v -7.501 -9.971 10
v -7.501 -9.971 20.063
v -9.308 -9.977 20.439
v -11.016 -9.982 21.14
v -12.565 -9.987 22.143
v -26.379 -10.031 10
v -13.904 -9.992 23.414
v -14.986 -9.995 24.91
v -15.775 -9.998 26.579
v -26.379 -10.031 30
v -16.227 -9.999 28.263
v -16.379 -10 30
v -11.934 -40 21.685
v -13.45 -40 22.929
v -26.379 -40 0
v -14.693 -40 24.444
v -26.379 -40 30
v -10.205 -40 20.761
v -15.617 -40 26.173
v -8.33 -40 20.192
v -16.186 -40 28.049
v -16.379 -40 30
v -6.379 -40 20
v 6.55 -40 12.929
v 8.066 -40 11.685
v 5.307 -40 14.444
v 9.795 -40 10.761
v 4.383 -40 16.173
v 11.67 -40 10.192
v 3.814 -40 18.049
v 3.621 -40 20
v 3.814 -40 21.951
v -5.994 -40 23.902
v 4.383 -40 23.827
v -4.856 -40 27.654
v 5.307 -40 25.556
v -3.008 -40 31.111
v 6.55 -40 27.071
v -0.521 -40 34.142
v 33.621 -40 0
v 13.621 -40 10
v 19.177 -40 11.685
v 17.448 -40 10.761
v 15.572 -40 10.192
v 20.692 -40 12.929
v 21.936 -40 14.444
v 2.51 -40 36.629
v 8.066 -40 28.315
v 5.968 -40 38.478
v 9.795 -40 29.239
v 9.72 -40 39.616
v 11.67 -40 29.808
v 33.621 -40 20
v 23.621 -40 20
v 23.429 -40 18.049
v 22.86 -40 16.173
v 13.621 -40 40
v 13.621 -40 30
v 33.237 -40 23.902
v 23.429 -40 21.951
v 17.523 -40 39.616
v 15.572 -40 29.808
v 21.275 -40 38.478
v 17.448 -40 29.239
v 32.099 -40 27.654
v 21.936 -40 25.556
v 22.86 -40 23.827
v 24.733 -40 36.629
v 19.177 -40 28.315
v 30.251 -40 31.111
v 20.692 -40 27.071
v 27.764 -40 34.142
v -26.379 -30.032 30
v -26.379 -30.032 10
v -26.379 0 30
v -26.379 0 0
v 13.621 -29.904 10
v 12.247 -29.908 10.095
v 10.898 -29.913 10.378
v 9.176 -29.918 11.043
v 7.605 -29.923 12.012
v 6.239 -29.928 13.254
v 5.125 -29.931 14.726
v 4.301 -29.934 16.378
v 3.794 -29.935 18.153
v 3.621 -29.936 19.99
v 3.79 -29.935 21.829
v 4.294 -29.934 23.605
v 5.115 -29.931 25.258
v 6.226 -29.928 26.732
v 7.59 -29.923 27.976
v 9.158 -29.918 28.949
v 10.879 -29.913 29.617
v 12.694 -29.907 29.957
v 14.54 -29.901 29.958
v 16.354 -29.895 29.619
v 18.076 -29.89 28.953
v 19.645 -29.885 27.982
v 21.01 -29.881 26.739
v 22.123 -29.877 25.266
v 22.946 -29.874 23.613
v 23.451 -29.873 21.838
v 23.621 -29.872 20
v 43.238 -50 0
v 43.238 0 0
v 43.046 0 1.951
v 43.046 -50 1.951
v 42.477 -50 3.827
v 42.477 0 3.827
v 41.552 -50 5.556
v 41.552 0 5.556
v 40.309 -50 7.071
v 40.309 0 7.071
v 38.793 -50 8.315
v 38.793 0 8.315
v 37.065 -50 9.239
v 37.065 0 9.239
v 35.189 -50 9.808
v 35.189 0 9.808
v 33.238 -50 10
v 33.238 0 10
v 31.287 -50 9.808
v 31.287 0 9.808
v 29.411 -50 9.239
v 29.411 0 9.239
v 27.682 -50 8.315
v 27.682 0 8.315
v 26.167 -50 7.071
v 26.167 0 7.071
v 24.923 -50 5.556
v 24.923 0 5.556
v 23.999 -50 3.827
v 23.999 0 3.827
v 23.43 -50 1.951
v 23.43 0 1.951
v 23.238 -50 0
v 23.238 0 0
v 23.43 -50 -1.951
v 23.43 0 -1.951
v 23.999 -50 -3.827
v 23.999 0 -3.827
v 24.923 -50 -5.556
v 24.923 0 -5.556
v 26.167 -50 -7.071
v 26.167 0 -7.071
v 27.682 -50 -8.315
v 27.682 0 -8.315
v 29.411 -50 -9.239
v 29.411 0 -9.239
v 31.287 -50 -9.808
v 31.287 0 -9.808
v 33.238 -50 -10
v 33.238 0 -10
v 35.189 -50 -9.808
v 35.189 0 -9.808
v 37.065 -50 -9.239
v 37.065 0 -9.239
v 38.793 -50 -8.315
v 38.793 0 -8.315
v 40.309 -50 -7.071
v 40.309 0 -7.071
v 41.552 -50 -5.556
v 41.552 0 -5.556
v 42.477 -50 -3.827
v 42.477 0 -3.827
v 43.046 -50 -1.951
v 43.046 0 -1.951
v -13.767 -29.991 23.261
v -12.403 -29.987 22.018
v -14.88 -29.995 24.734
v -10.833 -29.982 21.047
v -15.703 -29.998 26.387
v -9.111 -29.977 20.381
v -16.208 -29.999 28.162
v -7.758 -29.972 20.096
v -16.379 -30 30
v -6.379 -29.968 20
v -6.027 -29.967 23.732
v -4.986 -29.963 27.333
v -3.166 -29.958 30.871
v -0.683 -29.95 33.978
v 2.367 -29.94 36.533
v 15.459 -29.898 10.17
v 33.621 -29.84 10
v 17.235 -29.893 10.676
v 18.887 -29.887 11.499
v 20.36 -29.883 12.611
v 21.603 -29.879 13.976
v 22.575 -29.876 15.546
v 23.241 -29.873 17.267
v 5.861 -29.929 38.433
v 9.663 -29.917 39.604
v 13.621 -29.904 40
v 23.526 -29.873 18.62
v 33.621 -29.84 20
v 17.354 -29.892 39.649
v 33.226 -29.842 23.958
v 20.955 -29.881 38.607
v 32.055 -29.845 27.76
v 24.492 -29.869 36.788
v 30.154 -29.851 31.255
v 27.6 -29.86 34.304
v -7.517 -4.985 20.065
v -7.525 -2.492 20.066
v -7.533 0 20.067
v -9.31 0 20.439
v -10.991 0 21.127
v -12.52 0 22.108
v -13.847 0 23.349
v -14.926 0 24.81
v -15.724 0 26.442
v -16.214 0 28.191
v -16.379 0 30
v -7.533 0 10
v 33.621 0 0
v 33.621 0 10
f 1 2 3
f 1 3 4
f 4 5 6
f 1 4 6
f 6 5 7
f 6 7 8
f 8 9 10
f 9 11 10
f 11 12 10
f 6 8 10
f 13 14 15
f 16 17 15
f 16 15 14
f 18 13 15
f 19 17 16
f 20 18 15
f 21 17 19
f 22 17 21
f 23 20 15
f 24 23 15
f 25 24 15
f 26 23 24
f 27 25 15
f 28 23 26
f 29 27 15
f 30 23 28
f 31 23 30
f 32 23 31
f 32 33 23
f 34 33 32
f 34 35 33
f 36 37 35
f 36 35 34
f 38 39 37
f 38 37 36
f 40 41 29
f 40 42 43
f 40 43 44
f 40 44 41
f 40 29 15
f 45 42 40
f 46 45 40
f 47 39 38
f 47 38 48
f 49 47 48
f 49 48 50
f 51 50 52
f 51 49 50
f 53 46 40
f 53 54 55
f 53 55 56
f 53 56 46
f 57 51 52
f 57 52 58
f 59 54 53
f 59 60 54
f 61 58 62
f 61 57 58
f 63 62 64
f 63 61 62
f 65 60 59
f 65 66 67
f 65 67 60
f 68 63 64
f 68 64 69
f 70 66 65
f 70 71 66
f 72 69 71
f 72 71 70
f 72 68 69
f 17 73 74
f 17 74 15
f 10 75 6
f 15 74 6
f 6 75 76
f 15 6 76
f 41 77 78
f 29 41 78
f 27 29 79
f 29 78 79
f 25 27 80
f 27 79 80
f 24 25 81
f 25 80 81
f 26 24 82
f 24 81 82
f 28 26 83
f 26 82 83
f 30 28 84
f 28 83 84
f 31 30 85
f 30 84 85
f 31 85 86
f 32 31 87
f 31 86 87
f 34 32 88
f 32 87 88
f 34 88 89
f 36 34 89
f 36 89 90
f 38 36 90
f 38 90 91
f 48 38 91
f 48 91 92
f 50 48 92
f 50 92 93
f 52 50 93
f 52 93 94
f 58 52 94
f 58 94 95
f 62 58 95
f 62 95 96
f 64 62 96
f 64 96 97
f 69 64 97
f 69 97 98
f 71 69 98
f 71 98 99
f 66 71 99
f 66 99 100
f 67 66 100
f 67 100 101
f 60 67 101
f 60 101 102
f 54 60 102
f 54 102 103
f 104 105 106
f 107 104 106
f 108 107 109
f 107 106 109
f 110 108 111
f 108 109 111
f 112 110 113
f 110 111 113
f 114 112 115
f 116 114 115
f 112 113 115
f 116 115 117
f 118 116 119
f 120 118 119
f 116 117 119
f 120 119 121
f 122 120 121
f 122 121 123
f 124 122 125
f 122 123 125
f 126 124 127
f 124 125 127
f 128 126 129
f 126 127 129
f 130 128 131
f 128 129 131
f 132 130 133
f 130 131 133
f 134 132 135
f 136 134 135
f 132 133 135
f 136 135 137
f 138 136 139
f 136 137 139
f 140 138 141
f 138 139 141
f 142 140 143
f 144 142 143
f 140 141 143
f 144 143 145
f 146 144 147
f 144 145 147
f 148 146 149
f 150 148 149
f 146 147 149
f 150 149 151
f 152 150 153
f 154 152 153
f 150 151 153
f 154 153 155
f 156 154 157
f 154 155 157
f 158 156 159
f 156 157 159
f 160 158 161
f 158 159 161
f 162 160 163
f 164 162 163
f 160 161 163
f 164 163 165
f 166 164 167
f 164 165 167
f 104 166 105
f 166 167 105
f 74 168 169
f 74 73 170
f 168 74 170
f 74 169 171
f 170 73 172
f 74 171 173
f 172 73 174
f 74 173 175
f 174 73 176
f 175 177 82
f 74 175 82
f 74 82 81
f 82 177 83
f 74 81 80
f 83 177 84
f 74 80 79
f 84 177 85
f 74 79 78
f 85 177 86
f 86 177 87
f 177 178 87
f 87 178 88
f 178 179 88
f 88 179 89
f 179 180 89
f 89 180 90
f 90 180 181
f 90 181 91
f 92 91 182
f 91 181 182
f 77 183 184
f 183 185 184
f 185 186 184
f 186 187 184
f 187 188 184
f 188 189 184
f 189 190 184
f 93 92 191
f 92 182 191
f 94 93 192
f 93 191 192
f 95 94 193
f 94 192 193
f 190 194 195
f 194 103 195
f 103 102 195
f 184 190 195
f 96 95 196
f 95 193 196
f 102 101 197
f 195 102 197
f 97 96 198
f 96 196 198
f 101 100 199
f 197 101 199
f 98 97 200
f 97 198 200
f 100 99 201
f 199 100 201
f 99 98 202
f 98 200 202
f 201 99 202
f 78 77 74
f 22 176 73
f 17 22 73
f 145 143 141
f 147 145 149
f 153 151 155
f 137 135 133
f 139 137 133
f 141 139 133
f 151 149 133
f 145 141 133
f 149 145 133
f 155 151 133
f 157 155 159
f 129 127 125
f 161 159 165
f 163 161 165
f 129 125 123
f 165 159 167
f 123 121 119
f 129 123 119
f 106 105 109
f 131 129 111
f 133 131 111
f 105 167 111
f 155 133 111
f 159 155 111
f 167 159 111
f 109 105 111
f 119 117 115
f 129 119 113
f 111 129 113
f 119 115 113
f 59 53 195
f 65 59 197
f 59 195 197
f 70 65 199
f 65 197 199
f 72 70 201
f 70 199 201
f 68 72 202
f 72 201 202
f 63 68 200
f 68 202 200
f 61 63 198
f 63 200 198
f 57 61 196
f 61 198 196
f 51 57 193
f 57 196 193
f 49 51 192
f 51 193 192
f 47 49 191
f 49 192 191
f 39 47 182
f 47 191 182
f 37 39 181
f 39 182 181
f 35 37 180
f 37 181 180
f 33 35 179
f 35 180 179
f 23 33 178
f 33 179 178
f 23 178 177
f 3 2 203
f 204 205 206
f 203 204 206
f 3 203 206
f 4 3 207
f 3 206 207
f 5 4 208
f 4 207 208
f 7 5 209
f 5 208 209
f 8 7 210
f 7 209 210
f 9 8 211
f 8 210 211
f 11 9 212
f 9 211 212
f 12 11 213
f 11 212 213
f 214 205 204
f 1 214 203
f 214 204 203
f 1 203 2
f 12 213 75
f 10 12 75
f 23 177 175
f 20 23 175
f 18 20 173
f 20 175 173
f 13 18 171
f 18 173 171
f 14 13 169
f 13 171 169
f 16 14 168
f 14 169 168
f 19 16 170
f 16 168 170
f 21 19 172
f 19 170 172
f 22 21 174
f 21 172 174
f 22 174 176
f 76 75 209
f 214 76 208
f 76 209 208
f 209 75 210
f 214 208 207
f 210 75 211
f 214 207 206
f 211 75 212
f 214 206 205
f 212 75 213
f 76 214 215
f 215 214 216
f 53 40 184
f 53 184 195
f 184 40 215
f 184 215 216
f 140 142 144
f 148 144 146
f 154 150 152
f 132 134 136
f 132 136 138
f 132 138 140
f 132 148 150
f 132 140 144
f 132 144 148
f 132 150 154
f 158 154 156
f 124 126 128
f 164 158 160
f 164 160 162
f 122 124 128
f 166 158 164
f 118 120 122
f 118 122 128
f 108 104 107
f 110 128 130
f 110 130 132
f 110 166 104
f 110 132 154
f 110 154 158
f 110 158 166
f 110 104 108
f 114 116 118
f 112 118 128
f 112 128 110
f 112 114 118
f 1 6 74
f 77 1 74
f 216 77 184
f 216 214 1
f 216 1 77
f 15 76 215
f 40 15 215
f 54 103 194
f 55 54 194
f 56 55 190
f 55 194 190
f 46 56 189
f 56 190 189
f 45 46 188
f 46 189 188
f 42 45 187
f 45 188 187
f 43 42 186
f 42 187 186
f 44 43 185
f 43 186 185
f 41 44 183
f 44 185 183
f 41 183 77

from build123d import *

# Parameters (mm, degrees)
F1_DEPTH = 40
F4_DEPTH = 30
F5_R     = 10
F6_DEPTH = 50


with BuildPart() as f1:
    # F0 (on Front) → F1 (new body)
    with BuildSketch(Plane.XZ):
        with BuildLine():
            Line((-26.3786203787, 30), (-26.3786203787, 0))
            Line((-26.3786203787, 0), (33.6213796213, 0))
            Line((33.6213796213, 0), (33.6213796213, 10))
            Line((33.6213796213, 10), (13.6213796213, 10))
            Line((13.6213796213, 10), (-6.3786203787, 10))
            Line((-6.3786203787, 10), (-6.3786203787, 20))
            ThreePointArc((-6.3786203787, 20), (-13.4496881905, 22.9289321881), (-16.3786203787, 30))
            Line((-16.3786203787, 30), (-26.3786203787, 30))
        make_face()
        with BuildLine():
            Line((13.6213796213, 10), (33.6213796213, 10))
            Line((33.6213796213, 10), (33.6213796213, 20))
            ThreePointArc((33.6213796213, 20), (13.6213796213, 40), (-6.3786203787, 20))
            Line((-6.3786203787, 20), (-6.3786203787, 10))
            Line((-6.3786203787, 10), (13.6213796213, 10))
        make_face()
        with BuildLine():
            ThreePointArc((23.6213796213, 20), (20.6924474332, 12.9289321881), (13.6213796213, 10))
            ThreePointArc((13.6213796213, 10), (6.5503118095, 27.0710678119), (23.6213796213, 20))
        make_face(mode=Mode.SUBTRACT)
    extrude(amount=F1_DEPTH)

    # F3 (on offset) → F4 (cut)
    with BuildSketch(Plane.XY.offset(40)):
        Polygon((34.5625896442, -29.8374285476), (34.5625896442, -10.029780087), (34.5625896442, 0.1627235876), (-7.532738143, 0.0286622326), (-7.5008912179, -9.9712870559), (-27.5007897949, -10.0349809062), (-27.4370959447, -30.0348794832), (-16.4371517273, -29.9998478656), align=None)
    extrude(amount=-F4_DEPTH, mode=Mode.SUBTRACT)


with BuildPart() as f6:
    # F5 (on Front) → F6 (new body)
    with BuildSketch(Plane.XZ):
        with Locations((33.2377943532, 0)):
            Circle(F5_R)
    extrude(amount=F6_DEPTH)


solid = Compound([f1.part, f6.part])
